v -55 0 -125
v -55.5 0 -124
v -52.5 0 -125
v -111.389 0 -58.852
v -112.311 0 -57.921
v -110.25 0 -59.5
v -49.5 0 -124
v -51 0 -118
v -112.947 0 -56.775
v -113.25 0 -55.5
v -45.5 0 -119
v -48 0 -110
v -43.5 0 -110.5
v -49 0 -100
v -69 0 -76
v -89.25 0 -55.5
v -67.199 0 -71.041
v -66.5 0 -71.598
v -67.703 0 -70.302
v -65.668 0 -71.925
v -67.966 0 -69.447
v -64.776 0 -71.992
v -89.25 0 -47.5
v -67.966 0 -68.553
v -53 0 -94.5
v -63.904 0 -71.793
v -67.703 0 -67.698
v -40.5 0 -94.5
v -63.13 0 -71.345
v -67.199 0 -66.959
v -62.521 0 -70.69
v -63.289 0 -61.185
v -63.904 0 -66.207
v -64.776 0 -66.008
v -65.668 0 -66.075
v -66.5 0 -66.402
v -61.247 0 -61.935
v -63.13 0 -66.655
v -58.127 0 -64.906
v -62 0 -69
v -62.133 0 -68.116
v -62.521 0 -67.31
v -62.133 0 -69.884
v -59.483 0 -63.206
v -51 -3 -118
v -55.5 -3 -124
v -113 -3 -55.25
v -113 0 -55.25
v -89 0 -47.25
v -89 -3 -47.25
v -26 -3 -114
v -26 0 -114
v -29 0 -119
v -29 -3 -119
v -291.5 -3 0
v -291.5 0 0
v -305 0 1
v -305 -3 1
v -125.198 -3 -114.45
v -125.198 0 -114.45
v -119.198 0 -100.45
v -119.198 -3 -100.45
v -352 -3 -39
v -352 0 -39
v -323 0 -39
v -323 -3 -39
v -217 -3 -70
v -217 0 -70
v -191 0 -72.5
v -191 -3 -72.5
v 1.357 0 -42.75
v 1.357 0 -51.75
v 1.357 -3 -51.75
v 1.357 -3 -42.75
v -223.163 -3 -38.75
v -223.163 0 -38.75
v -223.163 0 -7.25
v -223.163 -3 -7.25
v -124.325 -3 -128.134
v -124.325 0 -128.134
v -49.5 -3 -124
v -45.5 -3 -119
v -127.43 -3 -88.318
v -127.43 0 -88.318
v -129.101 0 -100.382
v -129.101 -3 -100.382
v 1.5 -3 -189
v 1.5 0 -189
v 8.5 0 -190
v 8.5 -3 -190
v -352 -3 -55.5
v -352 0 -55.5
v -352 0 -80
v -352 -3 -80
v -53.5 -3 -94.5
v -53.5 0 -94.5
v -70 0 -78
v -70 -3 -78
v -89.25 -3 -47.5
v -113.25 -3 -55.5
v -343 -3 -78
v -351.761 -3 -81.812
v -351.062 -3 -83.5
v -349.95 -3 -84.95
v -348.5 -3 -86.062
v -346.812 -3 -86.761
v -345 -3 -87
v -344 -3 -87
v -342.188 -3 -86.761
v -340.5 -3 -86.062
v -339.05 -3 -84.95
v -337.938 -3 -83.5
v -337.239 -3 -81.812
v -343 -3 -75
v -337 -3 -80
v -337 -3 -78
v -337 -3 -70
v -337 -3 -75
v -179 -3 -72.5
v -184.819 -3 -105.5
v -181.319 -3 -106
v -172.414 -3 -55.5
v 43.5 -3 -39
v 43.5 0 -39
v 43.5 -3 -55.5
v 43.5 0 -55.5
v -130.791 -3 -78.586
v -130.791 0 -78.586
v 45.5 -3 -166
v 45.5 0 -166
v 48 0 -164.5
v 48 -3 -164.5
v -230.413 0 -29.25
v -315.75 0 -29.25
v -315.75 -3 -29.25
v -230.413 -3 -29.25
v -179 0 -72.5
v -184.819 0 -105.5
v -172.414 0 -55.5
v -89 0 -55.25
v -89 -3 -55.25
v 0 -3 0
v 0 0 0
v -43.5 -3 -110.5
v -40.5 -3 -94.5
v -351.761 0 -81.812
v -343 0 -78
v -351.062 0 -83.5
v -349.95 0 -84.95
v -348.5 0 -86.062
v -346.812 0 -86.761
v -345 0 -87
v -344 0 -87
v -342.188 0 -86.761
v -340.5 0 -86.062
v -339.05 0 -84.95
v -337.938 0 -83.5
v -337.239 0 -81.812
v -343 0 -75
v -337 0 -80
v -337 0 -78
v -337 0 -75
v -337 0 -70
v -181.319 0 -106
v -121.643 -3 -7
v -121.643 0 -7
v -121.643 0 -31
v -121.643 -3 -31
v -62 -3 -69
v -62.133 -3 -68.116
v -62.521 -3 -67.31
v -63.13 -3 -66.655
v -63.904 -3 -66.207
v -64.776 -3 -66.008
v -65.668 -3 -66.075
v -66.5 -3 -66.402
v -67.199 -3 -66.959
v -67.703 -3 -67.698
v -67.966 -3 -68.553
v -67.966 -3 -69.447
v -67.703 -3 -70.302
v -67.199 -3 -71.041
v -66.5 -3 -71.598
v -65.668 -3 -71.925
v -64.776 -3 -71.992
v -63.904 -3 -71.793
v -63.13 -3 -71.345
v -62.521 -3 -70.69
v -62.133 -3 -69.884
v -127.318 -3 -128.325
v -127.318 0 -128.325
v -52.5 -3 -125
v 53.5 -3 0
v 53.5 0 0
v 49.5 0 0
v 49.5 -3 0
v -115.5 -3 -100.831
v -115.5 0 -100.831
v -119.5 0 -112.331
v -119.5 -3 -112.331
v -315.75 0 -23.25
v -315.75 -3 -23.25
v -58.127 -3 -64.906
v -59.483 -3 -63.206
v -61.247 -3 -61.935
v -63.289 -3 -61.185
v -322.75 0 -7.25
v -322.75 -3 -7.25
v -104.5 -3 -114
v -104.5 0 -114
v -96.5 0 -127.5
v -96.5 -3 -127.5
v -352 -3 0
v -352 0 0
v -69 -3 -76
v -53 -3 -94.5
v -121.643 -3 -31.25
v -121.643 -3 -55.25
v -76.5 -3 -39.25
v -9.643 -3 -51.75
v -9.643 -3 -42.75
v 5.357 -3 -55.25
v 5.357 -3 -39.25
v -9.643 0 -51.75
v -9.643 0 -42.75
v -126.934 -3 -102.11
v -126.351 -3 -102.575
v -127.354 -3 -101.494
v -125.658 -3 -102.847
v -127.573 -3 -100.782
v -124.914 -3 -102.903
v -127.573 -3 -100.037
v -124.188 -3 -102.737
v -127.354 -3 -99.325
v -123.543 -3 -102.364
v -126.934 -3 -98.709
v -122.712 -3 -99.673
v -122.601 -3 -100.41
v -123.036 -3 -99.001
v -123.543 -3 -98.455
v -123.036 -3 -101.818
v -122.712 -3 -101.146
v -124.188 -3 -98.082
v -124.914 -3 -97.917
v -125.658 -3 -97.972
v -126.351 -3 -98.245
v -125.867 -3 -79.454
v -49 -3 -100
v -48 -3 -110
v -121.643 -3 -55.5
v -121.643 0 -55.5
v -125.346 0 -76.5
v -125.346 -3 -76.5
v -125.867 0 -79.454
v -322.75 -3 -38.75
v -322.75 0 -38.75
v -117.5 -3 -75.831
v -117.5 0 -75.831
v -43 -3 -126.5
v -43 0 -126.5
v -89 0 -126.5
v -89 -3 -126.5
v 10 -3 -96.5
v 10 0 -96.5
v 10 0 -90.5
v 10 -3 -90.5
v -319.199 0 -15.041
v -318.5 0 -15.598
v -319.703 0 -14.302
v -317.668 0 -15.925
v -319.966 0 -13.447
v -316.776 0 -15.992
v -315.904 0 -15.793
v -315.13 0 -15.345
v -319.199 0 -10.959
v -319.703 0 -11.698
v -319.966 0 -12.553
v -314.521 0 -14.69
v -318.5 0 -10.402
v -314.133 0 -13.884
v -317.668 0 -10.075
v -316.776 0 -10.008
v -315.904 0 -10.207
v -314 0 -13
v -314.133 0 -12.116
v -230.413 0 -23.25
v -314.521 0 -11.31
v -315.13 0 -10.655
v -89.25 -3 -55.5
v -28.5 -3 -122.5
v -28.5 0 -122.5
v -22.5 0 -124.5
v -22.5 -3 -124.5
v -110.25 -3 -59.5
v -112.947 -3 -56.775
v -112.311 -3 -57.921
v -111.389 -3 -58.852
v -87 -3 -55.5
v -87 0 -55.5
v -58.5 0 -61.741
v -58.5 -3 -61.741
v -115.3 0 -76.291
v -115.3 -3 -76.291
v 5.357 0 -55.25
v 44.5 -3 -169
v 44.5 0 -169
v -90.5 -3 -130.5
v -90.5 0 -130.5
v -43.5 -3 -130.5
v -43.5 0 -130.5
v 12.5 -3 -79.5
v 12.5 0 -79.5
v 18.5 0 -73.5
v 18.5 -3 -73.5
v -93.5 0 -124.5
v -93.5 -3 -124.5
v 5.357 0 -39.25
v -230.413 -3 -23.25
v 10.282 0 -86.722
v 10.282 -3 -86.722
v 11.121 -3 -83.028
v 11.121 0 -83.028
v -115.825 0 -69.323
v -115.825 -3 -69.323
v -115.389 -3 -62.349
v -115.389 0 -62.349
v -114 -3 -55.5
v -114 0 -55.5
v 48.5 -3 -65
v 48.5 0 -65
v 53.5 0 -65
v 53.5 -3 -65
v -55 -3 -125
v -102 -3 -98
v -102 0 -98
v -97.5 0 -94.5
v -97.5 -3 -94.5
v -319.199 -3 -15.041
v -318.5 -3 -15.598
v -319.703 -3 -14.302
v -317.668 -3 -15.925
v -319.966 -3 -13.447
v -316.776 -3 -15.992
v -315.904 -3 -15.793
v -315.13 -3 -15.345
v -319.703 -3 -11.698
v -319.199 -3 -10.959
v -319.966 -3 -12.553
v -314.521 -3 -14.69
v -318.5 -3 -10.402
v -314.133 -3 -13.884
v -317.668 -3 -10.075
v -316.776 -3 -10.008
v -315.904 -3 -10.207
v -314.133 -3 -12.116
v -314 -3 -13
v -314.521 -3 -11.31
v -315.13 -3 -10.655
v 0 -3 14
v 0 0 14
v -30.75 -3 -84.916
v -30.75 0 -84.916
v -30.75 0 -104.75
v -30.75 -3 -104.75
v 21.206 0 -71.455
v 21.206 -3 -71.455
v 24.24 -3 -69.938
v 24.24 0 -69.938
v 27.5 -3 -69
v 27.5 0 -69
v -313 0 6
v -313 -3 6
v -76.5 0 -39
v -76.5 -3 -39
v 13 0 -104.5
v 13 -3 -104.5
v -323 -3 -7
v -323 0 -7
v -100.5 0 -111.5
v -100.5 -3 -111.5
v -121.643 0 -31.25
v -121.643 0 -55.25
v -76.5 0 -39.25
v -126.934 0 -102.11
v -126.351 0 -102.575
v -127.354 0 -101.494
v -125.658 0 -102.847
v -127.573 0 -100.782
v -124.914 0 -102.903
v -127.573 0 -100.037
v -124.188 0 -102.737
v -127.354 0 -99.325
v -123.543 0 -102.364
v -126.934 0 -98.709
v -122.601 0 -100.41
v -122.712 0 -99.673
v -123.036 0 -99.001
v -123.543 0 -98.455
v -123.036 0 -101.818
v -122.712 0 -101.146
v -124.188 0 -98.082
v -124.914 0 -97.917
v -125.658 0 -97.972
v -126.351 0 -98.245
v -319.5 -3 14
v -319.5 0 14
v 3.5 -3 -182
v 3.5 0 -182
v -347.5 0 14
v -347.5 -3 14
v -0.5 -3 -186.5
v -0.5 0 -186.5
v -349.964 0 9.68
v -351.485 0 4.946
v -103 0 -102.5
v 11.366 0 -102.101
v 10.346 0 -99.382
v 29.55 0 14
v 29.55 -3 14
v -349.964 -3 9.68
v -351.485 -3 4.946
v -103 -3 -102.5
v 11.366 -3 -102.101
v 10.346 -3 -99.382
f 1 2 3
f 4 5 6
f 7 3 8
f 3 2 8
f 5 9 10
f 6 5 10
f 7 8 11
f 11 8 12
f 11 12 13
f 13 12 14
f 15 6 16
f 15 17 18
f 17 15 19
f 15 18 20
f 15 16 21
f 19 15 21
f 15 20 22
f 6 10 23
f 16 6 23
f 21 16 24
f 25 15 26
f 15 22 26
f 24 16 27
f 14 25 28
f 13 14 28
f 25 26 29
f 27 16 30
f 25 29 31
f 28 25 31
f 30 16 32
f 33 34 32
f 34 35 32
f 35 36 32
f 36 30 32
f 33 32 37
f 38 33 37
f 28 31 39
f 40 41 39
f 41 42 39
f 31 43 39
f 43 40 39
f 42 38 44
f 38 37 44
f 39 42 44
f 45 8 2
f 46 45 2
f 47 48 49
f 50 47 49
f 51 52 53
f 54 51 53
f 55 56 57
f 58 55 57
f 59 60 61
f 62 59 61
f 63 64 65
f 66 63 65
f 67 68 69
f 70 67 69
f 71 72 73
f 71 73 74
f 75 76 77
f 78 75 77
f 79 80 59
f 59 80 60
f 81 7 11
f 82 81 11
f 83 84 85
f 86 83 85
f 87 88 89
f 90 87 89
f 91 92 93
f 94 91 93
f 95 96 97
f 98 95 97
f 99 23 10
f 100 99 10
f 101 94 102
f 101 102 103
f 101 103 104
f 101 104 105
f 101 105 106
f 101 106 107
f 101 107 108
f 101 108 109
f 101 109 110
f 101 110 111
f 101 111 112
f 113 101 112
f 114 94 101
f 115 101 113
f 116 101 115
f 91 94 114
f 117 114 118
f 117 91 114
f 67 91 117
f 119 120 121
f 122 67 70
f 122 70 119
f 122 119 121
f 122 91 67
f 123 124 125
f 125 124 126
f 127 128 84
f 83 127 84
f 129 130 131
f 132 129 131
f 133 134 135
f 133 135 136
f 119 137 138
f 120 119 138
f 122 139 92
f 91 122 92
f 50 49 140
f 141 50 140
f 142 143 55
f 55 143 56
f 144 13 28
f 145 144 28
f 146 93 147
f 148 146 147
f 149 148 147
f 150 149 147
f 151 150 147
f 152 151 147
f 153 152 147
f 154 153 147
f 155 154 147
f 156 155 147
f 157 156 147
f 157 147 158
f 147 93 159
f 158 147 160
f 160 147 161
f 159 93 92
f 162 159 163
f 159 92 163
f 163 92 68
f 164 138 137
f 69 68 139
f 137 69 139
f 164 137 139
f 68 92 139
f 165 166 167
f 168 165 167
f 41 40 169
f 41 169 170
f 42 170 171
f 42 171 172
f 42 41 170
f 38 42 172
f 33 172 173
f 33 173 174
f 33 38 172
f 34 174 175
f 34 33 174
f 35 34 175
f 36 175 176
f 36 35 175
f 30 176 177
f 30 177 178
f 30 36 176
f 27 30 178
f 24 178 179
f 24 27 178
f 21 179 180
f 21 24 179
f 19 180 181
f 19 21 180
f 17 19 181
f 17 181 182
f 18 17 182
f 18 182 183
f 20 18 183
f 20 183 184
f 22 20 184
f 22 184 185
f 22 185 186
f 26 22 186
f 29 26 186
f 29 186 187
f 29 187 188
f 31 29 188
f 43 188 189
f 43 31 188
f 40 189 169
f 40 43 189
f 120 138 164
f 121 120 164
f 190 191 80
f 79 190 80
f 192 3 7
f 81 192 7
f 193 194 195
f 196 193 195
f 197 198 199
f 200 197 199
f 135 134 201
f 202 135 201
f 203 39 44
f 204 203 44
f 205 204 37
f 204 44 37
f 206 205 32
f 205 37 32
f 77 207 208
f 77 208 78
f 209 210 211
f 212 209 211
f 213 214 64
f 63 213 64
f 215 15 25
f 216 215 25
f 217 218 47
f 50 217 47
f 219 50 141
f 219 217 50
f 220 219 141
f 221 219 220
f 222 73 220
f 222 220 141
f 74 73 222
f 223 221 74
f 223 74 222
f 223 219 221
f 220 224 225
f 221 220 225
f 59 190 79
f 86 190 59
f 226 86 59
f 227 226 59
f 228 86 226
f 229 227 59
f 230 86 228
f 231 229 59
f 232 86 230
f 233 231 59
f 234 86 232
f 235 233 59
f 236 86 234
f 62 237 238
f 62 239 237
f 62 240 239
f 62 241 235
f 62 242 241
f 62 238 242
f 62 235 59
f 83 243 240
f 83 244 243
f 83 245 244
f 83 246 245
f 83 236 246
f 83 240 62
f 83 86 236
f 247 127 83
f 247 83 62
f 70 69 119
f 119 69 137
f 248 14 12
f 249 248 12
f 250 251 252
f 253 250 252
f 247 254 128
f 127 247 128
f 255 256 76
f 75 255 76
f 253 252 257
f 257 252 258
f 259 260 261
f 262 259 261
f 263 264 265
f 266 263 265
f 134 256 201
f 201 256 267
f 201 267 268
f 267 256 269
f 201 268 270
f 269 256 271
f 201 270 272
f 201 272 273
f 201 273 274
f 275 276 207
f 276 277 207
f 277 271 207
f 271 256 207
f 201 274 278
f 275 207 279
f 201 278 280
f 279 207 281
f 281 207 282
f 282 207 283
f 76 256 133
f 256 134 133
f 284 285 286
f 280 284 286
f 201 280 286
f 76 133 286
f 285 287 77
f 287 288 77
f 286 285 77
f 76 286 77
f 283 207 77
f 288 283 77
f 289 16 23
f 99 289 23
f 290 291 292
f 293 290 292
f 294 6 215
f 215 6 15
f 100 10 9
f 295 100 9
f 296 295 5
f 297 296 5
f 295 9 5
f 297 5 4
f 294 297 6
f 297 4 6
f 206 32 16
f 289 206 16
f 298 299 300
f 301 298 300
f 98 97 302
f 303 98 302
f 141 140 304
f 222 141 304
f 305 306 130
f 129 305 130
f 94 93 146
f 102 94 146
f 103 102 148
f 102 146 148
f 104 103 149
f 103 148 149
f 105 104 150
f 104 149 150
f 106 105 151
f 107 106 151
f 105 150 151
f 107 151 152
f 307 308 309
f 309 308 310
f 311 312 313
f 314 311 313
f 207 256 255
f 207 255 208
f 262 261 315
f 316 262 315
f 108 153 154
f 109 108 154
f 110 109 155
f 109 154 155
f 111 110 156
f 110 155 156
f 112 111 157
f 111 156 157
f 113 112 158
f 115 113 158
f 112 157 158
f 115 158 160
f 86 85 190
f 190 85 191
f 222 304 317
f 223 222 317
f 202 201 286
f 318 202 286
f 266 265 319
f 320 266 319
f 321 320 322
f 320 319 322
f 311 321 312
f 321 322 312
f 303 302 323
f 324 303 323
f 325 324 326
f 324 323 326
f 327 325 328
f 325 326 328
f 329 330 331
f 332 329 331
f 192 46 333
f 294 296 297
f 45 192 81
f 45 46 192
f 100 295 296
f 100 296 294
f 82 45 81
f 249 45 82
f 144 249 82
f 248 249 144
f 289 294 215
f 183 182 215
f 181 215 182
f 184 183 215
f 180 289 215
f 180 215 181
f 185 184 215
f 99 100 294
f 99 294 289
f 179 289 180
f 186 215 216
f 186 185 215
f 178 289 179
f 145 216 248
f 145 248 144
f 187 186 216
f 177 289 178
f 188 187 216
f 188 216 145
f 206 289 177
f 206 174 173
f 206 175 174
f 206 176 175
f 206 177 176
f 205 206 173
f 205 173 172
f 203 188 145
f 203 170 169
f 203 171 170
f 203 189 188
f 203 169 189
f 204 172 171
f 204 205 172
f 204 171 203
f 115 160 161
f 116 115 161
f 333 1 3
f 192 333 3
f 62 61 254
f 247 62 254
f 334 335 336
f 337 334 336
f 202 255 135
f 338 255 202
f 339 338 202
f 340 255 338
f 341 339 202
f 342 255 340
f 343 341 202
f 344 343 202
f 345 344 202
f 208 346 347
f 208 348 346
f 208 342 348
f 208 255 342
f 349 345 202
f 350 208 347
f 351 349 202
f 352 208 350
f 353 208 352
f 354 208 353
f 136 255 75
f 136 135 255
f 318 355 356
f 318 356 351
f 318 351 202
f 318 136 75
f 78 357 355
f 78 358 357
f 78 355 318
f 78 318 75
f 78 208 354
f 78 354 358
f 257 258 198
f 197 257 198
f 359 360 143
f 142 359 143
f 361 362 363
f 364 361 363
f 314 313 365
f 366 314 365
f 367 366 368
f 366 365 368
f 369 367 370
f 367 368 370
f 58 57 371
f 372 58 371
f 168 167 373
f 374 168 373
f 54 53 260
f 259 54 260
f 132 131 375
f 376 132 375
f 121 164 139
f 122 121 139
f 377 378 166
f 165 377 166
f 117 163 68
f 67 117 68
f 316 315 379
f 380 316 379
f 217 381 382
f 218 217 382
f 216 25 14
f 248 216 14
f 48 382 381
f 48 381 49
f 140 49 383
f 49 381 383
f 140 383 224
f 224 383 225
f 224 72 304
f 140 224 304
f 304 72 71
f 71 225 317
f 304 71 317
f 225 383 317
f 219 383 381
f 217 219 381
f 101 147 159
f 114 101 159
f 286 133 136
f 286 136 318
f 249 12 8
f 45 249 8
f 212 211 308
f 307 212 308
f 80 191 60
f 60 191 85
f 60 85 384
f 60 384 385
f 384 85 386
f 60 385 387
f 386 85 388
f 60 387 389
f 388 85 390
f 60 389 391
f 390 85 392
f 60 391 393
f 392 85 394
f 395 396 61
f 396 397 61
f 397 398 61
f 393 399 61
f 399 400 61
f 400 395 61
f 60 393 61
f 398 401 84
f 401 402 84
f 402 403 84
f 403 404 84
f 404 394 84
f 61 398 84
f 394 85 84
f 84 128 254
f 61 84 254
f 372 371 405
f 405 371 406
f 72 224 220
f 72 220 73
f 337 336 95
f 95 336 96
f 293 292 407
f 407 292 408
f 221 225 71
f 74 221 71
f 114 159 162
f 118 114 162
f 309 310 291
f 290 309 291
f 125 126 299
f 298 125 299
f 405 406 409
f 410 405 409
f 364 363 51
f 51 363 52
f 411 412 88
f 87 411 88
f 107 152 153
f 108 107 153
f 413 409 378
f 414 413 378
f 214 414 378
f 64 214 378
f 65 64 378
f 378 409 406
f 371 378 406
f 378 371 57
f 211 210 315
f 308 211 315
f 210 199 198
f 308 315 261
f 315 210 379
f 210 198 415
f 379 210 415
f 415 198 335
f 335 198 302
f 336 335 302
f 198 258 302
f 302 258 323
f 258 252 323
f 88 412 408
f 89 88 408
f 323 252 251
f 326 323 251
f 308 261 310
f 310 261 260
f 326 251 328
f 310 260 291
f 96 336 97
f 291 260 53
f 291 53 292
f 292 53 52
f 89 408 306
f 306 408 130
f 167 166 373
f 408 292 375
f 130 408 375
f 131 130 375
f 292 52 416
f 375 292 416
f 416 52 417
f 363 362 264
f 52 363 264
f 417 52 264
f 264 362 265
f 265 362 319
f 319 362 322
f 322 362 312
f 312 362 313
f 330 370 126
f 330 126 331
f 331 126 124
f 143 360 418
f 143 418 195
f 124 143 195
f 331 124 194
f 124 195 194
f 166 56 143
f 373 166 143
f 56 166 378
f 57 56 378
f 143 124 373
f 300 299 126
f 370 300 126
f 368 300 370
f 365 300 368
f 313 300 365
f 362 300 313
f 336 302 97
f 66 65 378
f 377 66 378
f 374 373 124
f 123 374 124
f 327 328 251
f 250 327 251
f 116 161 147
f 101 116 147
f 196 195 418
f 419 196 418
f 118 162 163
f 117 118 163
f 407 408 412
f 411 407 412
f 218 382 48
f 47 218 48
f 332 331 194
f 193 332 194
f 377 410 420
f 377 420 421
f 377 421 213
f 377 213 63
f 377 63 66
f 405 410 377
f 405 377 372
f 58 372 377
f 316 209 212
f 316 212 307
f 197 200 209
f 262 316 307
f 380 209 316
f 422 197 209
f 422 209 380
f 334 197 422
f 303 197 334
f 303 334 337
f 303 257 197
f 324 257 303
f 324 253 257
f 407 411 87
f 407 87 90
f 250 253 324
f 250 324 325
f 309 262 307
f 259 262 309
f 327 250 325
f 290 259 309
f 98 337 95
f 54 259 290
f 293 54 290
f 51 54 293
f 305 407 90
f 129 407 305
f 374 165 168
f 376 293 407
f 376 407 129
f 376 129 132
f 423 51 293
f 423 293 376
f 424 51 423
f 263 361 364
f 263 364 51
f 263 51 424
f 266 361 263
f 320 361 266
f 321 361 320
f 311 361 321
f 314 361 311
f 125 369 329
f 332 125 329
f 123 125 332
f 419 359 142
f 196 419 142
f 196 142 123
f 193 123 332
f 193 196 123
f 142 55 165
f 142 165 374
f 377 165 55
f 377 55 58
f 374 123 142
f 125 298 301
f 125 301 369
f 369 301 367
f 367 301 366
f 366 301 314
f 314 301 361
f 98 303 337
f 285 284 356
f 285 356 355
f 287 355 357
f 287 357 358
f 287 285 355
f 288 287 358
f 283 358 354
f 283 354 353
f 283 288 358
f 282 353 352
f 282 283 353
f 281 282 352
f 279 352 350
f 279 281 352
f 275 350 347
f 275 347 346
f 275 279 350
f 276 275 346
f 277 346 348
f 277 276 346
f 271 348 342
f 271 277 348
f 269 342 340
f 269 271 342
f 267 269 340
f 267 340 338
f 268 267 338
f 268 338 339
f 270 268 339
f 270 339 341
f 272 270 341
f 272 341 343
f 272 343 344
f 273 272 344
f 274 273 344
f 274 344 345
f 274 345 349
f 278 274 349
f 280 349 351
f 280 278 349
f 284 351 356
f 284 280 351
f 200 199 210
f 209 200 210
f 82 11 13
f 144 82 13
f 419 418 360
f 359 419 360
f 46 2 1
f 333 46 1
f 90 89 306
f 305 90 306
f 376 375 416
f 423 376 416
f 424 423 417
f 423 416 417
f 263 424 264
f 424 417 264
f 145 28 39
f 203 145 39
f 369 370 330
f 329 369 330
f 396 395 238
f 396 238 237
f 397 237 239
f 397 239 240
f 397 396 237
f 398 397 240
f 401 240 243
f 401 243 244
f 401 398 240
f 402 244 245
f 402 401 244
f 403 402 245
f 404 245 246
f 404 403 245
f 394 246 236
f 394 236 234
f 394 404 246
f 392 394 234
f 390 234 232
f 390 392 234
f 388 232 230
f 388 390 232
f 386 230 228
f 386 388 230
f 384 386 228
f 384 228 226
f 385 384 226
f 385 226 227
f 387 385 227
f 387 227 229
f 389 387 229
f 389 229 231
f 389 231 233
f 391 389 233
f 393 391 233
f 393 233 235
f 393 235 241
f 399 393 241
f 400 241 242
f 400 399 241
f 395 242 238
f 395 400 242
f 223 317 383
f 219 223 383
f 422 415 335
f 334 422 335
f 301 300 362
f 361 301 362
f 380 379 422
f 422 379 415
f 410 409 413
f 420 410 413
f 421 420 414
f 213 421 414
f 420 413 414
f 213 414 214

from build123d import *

# Parameters (mm, degrees)
F0_R     = 3
F0_W     = 11
F0_H     = 9
F0_W_2   = 99.587
F0_H_2   = 31.5
F0_W_3   = 85.337
F0_H_3   = 6
F0_R_2   = 2.5
F1_DEPTH = 3


with BuildPart() as f1:
    # F0 (on Front) → F1 (new body)
    with BuildSketch(Plane.XZ):
        with BuildLine():
            Line((48.5, -65), (53.5, -65))
            Line((53.5, -65), (53.5, 0))
            Line((53.5, 0), (49.5, 0))
            Line((49.5, 0), (29.55, 14))
            Line((29.55, 14), (0, 14))
            Line((0, 14), (0, 0))
            Line((0, 0), (-291.5, 0))
            Line((-291.5, 0), (-305, 1))
            Line((-305, 1), (-313, 6))
            Line((-313, 6), (-319.5, 14))
            Line((-319.5, 14), (-347.5, 14))
            ThreePointArc((-347.5, 14), (-350.847353, 7.352721), (-352, 0))
            Line((-352, 0), (-352, -39))
            Line((-352, -39), (-323, -39))
            Line((-323, -39), (-323, -7))
            Line((-323, -7), (-209, -7))
            Line((-209, -7), (-121.642947, -7))
            Line((-121.642947, -7), (-121.642947, -31))
            Line((-121.642947, -31), (-76.5, -39))
            Line((-76.5, -39), (43.5, -39))
            Line((43.5, -39), (43.5, -55.5))
            Line((43.5, -55.5), (-87, -55.5))
            Line((-87, -55.5), (-58.5, -61.741119))
            Line((-58.5, -61.741119), (-30.75, -84.915683))
            Line((-30.75, -84.915683), (-30.75, -104.75))
            Line((-30.75, -104.75), (-26, -114))
            Line((-26, -114), (-29, -119))
            Line((-29, -119), (-43, -126.5))
            Line((-43, -126.5), (-89, -126.5))
            Line((-89, -126.5), (-93.5, -124.5))
            Line((-93.5, -124.5), (-100.5, -111.5))
            Line((-100.5, -111.5), (-103, -102.5))
            Line((-103, -102.5), (-102, -98))
            Line((-102, -98), (-97.5, -94.5))
            Line((-97.5, -94.5), (-53.5, -94.5))
            Line((-53.5, -94.5), (-70, -78))
            Line((-70, -78), (-115.3, -76.29109))
            ThreePointArc((-115.3, -76.29109), (-115.726619, -65.828228), (-114, -55.5))
            Line((-114, -55.5), (-121.642947, -55.5))
            Line((-121.642947, -55.5), (-125.345814, -76.5))
            Line((-125.345814, -76.5), (-117.5, -75.830911))
            Line((-117.5, -75.830911), (-115.5, -100.830911))
            Line((-115.5, -100.830911), (-119.5, -112.330911))
            Line((-119.5, -112.330911), (-104.5, -114))
            Line((-104.5, -114), (-96.5, -127.5))
            Line((-96.5, -127.5), (-90.5, -130.5))
            Line((-90.5, -130.5), (-43.5, -130.5))
            Line((-43.5, -130.5), (-28.5, -122.5))
            Line((-28.5, -122.5), (-22.5, -124.5))
            Line((-22.5, -124.5), (3.5, -182))
            Line((3.5, -182), (-0.5, -186.5))
            Line((-0.5, -186.5), (1.5, -189))
            Line((1.5, -189), (8.5, -190))
            Line((8.5, -190), (44.5, -169))
            Line((44.5, -169), (45.5, -166))
            Line((45.5, -166), (48, -164.5))
            Line((48, -164.5), (13, -104.5))
            ThreePointArc((13, -104.5), (10.774662, -100.772002), (10, -96.5))
            Line((10, -96.5), (10, -90.5))
            ThreePointArc((10, -90.5), (10.632869, -84.859743), (12.5, -79.5))
            Line((12.5, -79.5), (18.5, -73.5))
            ThreePointArc((18.5, -73.5), (22.688172, -70.626344), (27.5, -69))
            Line((27.5, -69), (48.5, -65))
        make_face()
        with BuildLine():
            ThreePointArc((-352, -80), (-349.949747, -84.949747), (-345, -87))
            Line((-345, -87), (-344, -87))
            ThreePointArc((-344, -87), (-339.050253, -84.949747), (-337, -80))
            Line((-337, -80), (-337, -78))
            Line((-337, -78), (-343, -78))
            Line((-343, -78), (-343, -75))
            Line((-343, -75), (-337, -75))
            Line((-337, -75), (-337, -70))
            Line((-337, -70), (-217, -70))
            Line((-217, -70), (-191, -72.5))
            Line((-191, -72.5), (-179, -72.5))
            Line((-179, -72.5), (-184.81879, -105.5))
            Line((-184.81879, -105.5), (-181.31879, -106))
            Line((-181.31879, -106), (-172.414278, -55.5))
            Line((-172.414278, -55.5), (-352, -55.5))
            Line((-352, -55.5), (-352, -80))
        make_face()
        with BuildLine():
            Line((-51, -118), (-55.5, -124))
            Line((-55.5, -124), (-55, -125))
            Line((-55, -125), (-52.5, -125))
            Line((-52.5, -125), (-49.5, -124))
            Line((-49.5, -124), (-45.5, -119))
            Line((-45.5, -119), (-43.5, -110.5))
            Line((-43.5, -110.5), (-40.5, -94.5))
            Line((-40.5, -94.5), (-58.126826, -64.906166))
            ThreePointArc((-58.126826, -64.906166), (-60.321871, -62.510385), (-63.28866, -61.185186))
            Line((-63.28866, -61.185186), (-89.25, -55.5))
            Line((-89.25, -55.5), (-89.25, -47.5))
            Line((-89.25, -47.5), (-113.25, -55.5))
            ThreePointArc((-113.25, -55.5), (-112.310832, -57.920624), (-110.25, -59.5))
            Line((-110.25, -59.5), (-69, -76))
            Line((-69, -76), (-53, -94.5))
            Line((-53, -94.5), (-49, -100))
            Line((-49, -100), (-48, -110))
            Line((-48, -110), (-51, -118))
        make_face()
        with Locations((-65, -69)):
            Circle(F0_R, mode=Mode.SUBTRACT)
        Polygon((-121.642947, -31.25), (-121.642947, -55.25), (-113, -55.25), (-89, -47.25), (-89, -55.25), (5.357053, -55.25), (5.357053, -39.25), (-76.5, -39.25), align=None)
        with Locations((-4.142947, -47.25)):
            Rectangle(F0_W, F0_H, mode=Mode.SUBTRACT)
        with Locations((-272.9565, -23)):
            Rectangle(F0_W_2, F0_H_2)
        with Locations((-317, -13)):
            Circle(F0_R, mode=Mode.SUBTRACT)
        with Locations((-273.0815, -26.25)):
            Rectangle(F0_W_3, F0_H_3, mode=Mode.SUBTRACT)
        Polygon((-124.324515, -128.134284), (-125.1976, -114.450121), (-119.1976, -100.450121), (-125.866758, -79.454423), (-130.790797, -78.586182), (-127.429592, -88.317693), (-129.101274, -100.38212), (-127.318428, -128.325303), align=None)
        with Locations((-125.101274, -100.409585)):
            Circle(F0_R_2, mode=Mode.SUBTRACT)
    extrude(amount=F1_DEPTH)


solid = f1.part
